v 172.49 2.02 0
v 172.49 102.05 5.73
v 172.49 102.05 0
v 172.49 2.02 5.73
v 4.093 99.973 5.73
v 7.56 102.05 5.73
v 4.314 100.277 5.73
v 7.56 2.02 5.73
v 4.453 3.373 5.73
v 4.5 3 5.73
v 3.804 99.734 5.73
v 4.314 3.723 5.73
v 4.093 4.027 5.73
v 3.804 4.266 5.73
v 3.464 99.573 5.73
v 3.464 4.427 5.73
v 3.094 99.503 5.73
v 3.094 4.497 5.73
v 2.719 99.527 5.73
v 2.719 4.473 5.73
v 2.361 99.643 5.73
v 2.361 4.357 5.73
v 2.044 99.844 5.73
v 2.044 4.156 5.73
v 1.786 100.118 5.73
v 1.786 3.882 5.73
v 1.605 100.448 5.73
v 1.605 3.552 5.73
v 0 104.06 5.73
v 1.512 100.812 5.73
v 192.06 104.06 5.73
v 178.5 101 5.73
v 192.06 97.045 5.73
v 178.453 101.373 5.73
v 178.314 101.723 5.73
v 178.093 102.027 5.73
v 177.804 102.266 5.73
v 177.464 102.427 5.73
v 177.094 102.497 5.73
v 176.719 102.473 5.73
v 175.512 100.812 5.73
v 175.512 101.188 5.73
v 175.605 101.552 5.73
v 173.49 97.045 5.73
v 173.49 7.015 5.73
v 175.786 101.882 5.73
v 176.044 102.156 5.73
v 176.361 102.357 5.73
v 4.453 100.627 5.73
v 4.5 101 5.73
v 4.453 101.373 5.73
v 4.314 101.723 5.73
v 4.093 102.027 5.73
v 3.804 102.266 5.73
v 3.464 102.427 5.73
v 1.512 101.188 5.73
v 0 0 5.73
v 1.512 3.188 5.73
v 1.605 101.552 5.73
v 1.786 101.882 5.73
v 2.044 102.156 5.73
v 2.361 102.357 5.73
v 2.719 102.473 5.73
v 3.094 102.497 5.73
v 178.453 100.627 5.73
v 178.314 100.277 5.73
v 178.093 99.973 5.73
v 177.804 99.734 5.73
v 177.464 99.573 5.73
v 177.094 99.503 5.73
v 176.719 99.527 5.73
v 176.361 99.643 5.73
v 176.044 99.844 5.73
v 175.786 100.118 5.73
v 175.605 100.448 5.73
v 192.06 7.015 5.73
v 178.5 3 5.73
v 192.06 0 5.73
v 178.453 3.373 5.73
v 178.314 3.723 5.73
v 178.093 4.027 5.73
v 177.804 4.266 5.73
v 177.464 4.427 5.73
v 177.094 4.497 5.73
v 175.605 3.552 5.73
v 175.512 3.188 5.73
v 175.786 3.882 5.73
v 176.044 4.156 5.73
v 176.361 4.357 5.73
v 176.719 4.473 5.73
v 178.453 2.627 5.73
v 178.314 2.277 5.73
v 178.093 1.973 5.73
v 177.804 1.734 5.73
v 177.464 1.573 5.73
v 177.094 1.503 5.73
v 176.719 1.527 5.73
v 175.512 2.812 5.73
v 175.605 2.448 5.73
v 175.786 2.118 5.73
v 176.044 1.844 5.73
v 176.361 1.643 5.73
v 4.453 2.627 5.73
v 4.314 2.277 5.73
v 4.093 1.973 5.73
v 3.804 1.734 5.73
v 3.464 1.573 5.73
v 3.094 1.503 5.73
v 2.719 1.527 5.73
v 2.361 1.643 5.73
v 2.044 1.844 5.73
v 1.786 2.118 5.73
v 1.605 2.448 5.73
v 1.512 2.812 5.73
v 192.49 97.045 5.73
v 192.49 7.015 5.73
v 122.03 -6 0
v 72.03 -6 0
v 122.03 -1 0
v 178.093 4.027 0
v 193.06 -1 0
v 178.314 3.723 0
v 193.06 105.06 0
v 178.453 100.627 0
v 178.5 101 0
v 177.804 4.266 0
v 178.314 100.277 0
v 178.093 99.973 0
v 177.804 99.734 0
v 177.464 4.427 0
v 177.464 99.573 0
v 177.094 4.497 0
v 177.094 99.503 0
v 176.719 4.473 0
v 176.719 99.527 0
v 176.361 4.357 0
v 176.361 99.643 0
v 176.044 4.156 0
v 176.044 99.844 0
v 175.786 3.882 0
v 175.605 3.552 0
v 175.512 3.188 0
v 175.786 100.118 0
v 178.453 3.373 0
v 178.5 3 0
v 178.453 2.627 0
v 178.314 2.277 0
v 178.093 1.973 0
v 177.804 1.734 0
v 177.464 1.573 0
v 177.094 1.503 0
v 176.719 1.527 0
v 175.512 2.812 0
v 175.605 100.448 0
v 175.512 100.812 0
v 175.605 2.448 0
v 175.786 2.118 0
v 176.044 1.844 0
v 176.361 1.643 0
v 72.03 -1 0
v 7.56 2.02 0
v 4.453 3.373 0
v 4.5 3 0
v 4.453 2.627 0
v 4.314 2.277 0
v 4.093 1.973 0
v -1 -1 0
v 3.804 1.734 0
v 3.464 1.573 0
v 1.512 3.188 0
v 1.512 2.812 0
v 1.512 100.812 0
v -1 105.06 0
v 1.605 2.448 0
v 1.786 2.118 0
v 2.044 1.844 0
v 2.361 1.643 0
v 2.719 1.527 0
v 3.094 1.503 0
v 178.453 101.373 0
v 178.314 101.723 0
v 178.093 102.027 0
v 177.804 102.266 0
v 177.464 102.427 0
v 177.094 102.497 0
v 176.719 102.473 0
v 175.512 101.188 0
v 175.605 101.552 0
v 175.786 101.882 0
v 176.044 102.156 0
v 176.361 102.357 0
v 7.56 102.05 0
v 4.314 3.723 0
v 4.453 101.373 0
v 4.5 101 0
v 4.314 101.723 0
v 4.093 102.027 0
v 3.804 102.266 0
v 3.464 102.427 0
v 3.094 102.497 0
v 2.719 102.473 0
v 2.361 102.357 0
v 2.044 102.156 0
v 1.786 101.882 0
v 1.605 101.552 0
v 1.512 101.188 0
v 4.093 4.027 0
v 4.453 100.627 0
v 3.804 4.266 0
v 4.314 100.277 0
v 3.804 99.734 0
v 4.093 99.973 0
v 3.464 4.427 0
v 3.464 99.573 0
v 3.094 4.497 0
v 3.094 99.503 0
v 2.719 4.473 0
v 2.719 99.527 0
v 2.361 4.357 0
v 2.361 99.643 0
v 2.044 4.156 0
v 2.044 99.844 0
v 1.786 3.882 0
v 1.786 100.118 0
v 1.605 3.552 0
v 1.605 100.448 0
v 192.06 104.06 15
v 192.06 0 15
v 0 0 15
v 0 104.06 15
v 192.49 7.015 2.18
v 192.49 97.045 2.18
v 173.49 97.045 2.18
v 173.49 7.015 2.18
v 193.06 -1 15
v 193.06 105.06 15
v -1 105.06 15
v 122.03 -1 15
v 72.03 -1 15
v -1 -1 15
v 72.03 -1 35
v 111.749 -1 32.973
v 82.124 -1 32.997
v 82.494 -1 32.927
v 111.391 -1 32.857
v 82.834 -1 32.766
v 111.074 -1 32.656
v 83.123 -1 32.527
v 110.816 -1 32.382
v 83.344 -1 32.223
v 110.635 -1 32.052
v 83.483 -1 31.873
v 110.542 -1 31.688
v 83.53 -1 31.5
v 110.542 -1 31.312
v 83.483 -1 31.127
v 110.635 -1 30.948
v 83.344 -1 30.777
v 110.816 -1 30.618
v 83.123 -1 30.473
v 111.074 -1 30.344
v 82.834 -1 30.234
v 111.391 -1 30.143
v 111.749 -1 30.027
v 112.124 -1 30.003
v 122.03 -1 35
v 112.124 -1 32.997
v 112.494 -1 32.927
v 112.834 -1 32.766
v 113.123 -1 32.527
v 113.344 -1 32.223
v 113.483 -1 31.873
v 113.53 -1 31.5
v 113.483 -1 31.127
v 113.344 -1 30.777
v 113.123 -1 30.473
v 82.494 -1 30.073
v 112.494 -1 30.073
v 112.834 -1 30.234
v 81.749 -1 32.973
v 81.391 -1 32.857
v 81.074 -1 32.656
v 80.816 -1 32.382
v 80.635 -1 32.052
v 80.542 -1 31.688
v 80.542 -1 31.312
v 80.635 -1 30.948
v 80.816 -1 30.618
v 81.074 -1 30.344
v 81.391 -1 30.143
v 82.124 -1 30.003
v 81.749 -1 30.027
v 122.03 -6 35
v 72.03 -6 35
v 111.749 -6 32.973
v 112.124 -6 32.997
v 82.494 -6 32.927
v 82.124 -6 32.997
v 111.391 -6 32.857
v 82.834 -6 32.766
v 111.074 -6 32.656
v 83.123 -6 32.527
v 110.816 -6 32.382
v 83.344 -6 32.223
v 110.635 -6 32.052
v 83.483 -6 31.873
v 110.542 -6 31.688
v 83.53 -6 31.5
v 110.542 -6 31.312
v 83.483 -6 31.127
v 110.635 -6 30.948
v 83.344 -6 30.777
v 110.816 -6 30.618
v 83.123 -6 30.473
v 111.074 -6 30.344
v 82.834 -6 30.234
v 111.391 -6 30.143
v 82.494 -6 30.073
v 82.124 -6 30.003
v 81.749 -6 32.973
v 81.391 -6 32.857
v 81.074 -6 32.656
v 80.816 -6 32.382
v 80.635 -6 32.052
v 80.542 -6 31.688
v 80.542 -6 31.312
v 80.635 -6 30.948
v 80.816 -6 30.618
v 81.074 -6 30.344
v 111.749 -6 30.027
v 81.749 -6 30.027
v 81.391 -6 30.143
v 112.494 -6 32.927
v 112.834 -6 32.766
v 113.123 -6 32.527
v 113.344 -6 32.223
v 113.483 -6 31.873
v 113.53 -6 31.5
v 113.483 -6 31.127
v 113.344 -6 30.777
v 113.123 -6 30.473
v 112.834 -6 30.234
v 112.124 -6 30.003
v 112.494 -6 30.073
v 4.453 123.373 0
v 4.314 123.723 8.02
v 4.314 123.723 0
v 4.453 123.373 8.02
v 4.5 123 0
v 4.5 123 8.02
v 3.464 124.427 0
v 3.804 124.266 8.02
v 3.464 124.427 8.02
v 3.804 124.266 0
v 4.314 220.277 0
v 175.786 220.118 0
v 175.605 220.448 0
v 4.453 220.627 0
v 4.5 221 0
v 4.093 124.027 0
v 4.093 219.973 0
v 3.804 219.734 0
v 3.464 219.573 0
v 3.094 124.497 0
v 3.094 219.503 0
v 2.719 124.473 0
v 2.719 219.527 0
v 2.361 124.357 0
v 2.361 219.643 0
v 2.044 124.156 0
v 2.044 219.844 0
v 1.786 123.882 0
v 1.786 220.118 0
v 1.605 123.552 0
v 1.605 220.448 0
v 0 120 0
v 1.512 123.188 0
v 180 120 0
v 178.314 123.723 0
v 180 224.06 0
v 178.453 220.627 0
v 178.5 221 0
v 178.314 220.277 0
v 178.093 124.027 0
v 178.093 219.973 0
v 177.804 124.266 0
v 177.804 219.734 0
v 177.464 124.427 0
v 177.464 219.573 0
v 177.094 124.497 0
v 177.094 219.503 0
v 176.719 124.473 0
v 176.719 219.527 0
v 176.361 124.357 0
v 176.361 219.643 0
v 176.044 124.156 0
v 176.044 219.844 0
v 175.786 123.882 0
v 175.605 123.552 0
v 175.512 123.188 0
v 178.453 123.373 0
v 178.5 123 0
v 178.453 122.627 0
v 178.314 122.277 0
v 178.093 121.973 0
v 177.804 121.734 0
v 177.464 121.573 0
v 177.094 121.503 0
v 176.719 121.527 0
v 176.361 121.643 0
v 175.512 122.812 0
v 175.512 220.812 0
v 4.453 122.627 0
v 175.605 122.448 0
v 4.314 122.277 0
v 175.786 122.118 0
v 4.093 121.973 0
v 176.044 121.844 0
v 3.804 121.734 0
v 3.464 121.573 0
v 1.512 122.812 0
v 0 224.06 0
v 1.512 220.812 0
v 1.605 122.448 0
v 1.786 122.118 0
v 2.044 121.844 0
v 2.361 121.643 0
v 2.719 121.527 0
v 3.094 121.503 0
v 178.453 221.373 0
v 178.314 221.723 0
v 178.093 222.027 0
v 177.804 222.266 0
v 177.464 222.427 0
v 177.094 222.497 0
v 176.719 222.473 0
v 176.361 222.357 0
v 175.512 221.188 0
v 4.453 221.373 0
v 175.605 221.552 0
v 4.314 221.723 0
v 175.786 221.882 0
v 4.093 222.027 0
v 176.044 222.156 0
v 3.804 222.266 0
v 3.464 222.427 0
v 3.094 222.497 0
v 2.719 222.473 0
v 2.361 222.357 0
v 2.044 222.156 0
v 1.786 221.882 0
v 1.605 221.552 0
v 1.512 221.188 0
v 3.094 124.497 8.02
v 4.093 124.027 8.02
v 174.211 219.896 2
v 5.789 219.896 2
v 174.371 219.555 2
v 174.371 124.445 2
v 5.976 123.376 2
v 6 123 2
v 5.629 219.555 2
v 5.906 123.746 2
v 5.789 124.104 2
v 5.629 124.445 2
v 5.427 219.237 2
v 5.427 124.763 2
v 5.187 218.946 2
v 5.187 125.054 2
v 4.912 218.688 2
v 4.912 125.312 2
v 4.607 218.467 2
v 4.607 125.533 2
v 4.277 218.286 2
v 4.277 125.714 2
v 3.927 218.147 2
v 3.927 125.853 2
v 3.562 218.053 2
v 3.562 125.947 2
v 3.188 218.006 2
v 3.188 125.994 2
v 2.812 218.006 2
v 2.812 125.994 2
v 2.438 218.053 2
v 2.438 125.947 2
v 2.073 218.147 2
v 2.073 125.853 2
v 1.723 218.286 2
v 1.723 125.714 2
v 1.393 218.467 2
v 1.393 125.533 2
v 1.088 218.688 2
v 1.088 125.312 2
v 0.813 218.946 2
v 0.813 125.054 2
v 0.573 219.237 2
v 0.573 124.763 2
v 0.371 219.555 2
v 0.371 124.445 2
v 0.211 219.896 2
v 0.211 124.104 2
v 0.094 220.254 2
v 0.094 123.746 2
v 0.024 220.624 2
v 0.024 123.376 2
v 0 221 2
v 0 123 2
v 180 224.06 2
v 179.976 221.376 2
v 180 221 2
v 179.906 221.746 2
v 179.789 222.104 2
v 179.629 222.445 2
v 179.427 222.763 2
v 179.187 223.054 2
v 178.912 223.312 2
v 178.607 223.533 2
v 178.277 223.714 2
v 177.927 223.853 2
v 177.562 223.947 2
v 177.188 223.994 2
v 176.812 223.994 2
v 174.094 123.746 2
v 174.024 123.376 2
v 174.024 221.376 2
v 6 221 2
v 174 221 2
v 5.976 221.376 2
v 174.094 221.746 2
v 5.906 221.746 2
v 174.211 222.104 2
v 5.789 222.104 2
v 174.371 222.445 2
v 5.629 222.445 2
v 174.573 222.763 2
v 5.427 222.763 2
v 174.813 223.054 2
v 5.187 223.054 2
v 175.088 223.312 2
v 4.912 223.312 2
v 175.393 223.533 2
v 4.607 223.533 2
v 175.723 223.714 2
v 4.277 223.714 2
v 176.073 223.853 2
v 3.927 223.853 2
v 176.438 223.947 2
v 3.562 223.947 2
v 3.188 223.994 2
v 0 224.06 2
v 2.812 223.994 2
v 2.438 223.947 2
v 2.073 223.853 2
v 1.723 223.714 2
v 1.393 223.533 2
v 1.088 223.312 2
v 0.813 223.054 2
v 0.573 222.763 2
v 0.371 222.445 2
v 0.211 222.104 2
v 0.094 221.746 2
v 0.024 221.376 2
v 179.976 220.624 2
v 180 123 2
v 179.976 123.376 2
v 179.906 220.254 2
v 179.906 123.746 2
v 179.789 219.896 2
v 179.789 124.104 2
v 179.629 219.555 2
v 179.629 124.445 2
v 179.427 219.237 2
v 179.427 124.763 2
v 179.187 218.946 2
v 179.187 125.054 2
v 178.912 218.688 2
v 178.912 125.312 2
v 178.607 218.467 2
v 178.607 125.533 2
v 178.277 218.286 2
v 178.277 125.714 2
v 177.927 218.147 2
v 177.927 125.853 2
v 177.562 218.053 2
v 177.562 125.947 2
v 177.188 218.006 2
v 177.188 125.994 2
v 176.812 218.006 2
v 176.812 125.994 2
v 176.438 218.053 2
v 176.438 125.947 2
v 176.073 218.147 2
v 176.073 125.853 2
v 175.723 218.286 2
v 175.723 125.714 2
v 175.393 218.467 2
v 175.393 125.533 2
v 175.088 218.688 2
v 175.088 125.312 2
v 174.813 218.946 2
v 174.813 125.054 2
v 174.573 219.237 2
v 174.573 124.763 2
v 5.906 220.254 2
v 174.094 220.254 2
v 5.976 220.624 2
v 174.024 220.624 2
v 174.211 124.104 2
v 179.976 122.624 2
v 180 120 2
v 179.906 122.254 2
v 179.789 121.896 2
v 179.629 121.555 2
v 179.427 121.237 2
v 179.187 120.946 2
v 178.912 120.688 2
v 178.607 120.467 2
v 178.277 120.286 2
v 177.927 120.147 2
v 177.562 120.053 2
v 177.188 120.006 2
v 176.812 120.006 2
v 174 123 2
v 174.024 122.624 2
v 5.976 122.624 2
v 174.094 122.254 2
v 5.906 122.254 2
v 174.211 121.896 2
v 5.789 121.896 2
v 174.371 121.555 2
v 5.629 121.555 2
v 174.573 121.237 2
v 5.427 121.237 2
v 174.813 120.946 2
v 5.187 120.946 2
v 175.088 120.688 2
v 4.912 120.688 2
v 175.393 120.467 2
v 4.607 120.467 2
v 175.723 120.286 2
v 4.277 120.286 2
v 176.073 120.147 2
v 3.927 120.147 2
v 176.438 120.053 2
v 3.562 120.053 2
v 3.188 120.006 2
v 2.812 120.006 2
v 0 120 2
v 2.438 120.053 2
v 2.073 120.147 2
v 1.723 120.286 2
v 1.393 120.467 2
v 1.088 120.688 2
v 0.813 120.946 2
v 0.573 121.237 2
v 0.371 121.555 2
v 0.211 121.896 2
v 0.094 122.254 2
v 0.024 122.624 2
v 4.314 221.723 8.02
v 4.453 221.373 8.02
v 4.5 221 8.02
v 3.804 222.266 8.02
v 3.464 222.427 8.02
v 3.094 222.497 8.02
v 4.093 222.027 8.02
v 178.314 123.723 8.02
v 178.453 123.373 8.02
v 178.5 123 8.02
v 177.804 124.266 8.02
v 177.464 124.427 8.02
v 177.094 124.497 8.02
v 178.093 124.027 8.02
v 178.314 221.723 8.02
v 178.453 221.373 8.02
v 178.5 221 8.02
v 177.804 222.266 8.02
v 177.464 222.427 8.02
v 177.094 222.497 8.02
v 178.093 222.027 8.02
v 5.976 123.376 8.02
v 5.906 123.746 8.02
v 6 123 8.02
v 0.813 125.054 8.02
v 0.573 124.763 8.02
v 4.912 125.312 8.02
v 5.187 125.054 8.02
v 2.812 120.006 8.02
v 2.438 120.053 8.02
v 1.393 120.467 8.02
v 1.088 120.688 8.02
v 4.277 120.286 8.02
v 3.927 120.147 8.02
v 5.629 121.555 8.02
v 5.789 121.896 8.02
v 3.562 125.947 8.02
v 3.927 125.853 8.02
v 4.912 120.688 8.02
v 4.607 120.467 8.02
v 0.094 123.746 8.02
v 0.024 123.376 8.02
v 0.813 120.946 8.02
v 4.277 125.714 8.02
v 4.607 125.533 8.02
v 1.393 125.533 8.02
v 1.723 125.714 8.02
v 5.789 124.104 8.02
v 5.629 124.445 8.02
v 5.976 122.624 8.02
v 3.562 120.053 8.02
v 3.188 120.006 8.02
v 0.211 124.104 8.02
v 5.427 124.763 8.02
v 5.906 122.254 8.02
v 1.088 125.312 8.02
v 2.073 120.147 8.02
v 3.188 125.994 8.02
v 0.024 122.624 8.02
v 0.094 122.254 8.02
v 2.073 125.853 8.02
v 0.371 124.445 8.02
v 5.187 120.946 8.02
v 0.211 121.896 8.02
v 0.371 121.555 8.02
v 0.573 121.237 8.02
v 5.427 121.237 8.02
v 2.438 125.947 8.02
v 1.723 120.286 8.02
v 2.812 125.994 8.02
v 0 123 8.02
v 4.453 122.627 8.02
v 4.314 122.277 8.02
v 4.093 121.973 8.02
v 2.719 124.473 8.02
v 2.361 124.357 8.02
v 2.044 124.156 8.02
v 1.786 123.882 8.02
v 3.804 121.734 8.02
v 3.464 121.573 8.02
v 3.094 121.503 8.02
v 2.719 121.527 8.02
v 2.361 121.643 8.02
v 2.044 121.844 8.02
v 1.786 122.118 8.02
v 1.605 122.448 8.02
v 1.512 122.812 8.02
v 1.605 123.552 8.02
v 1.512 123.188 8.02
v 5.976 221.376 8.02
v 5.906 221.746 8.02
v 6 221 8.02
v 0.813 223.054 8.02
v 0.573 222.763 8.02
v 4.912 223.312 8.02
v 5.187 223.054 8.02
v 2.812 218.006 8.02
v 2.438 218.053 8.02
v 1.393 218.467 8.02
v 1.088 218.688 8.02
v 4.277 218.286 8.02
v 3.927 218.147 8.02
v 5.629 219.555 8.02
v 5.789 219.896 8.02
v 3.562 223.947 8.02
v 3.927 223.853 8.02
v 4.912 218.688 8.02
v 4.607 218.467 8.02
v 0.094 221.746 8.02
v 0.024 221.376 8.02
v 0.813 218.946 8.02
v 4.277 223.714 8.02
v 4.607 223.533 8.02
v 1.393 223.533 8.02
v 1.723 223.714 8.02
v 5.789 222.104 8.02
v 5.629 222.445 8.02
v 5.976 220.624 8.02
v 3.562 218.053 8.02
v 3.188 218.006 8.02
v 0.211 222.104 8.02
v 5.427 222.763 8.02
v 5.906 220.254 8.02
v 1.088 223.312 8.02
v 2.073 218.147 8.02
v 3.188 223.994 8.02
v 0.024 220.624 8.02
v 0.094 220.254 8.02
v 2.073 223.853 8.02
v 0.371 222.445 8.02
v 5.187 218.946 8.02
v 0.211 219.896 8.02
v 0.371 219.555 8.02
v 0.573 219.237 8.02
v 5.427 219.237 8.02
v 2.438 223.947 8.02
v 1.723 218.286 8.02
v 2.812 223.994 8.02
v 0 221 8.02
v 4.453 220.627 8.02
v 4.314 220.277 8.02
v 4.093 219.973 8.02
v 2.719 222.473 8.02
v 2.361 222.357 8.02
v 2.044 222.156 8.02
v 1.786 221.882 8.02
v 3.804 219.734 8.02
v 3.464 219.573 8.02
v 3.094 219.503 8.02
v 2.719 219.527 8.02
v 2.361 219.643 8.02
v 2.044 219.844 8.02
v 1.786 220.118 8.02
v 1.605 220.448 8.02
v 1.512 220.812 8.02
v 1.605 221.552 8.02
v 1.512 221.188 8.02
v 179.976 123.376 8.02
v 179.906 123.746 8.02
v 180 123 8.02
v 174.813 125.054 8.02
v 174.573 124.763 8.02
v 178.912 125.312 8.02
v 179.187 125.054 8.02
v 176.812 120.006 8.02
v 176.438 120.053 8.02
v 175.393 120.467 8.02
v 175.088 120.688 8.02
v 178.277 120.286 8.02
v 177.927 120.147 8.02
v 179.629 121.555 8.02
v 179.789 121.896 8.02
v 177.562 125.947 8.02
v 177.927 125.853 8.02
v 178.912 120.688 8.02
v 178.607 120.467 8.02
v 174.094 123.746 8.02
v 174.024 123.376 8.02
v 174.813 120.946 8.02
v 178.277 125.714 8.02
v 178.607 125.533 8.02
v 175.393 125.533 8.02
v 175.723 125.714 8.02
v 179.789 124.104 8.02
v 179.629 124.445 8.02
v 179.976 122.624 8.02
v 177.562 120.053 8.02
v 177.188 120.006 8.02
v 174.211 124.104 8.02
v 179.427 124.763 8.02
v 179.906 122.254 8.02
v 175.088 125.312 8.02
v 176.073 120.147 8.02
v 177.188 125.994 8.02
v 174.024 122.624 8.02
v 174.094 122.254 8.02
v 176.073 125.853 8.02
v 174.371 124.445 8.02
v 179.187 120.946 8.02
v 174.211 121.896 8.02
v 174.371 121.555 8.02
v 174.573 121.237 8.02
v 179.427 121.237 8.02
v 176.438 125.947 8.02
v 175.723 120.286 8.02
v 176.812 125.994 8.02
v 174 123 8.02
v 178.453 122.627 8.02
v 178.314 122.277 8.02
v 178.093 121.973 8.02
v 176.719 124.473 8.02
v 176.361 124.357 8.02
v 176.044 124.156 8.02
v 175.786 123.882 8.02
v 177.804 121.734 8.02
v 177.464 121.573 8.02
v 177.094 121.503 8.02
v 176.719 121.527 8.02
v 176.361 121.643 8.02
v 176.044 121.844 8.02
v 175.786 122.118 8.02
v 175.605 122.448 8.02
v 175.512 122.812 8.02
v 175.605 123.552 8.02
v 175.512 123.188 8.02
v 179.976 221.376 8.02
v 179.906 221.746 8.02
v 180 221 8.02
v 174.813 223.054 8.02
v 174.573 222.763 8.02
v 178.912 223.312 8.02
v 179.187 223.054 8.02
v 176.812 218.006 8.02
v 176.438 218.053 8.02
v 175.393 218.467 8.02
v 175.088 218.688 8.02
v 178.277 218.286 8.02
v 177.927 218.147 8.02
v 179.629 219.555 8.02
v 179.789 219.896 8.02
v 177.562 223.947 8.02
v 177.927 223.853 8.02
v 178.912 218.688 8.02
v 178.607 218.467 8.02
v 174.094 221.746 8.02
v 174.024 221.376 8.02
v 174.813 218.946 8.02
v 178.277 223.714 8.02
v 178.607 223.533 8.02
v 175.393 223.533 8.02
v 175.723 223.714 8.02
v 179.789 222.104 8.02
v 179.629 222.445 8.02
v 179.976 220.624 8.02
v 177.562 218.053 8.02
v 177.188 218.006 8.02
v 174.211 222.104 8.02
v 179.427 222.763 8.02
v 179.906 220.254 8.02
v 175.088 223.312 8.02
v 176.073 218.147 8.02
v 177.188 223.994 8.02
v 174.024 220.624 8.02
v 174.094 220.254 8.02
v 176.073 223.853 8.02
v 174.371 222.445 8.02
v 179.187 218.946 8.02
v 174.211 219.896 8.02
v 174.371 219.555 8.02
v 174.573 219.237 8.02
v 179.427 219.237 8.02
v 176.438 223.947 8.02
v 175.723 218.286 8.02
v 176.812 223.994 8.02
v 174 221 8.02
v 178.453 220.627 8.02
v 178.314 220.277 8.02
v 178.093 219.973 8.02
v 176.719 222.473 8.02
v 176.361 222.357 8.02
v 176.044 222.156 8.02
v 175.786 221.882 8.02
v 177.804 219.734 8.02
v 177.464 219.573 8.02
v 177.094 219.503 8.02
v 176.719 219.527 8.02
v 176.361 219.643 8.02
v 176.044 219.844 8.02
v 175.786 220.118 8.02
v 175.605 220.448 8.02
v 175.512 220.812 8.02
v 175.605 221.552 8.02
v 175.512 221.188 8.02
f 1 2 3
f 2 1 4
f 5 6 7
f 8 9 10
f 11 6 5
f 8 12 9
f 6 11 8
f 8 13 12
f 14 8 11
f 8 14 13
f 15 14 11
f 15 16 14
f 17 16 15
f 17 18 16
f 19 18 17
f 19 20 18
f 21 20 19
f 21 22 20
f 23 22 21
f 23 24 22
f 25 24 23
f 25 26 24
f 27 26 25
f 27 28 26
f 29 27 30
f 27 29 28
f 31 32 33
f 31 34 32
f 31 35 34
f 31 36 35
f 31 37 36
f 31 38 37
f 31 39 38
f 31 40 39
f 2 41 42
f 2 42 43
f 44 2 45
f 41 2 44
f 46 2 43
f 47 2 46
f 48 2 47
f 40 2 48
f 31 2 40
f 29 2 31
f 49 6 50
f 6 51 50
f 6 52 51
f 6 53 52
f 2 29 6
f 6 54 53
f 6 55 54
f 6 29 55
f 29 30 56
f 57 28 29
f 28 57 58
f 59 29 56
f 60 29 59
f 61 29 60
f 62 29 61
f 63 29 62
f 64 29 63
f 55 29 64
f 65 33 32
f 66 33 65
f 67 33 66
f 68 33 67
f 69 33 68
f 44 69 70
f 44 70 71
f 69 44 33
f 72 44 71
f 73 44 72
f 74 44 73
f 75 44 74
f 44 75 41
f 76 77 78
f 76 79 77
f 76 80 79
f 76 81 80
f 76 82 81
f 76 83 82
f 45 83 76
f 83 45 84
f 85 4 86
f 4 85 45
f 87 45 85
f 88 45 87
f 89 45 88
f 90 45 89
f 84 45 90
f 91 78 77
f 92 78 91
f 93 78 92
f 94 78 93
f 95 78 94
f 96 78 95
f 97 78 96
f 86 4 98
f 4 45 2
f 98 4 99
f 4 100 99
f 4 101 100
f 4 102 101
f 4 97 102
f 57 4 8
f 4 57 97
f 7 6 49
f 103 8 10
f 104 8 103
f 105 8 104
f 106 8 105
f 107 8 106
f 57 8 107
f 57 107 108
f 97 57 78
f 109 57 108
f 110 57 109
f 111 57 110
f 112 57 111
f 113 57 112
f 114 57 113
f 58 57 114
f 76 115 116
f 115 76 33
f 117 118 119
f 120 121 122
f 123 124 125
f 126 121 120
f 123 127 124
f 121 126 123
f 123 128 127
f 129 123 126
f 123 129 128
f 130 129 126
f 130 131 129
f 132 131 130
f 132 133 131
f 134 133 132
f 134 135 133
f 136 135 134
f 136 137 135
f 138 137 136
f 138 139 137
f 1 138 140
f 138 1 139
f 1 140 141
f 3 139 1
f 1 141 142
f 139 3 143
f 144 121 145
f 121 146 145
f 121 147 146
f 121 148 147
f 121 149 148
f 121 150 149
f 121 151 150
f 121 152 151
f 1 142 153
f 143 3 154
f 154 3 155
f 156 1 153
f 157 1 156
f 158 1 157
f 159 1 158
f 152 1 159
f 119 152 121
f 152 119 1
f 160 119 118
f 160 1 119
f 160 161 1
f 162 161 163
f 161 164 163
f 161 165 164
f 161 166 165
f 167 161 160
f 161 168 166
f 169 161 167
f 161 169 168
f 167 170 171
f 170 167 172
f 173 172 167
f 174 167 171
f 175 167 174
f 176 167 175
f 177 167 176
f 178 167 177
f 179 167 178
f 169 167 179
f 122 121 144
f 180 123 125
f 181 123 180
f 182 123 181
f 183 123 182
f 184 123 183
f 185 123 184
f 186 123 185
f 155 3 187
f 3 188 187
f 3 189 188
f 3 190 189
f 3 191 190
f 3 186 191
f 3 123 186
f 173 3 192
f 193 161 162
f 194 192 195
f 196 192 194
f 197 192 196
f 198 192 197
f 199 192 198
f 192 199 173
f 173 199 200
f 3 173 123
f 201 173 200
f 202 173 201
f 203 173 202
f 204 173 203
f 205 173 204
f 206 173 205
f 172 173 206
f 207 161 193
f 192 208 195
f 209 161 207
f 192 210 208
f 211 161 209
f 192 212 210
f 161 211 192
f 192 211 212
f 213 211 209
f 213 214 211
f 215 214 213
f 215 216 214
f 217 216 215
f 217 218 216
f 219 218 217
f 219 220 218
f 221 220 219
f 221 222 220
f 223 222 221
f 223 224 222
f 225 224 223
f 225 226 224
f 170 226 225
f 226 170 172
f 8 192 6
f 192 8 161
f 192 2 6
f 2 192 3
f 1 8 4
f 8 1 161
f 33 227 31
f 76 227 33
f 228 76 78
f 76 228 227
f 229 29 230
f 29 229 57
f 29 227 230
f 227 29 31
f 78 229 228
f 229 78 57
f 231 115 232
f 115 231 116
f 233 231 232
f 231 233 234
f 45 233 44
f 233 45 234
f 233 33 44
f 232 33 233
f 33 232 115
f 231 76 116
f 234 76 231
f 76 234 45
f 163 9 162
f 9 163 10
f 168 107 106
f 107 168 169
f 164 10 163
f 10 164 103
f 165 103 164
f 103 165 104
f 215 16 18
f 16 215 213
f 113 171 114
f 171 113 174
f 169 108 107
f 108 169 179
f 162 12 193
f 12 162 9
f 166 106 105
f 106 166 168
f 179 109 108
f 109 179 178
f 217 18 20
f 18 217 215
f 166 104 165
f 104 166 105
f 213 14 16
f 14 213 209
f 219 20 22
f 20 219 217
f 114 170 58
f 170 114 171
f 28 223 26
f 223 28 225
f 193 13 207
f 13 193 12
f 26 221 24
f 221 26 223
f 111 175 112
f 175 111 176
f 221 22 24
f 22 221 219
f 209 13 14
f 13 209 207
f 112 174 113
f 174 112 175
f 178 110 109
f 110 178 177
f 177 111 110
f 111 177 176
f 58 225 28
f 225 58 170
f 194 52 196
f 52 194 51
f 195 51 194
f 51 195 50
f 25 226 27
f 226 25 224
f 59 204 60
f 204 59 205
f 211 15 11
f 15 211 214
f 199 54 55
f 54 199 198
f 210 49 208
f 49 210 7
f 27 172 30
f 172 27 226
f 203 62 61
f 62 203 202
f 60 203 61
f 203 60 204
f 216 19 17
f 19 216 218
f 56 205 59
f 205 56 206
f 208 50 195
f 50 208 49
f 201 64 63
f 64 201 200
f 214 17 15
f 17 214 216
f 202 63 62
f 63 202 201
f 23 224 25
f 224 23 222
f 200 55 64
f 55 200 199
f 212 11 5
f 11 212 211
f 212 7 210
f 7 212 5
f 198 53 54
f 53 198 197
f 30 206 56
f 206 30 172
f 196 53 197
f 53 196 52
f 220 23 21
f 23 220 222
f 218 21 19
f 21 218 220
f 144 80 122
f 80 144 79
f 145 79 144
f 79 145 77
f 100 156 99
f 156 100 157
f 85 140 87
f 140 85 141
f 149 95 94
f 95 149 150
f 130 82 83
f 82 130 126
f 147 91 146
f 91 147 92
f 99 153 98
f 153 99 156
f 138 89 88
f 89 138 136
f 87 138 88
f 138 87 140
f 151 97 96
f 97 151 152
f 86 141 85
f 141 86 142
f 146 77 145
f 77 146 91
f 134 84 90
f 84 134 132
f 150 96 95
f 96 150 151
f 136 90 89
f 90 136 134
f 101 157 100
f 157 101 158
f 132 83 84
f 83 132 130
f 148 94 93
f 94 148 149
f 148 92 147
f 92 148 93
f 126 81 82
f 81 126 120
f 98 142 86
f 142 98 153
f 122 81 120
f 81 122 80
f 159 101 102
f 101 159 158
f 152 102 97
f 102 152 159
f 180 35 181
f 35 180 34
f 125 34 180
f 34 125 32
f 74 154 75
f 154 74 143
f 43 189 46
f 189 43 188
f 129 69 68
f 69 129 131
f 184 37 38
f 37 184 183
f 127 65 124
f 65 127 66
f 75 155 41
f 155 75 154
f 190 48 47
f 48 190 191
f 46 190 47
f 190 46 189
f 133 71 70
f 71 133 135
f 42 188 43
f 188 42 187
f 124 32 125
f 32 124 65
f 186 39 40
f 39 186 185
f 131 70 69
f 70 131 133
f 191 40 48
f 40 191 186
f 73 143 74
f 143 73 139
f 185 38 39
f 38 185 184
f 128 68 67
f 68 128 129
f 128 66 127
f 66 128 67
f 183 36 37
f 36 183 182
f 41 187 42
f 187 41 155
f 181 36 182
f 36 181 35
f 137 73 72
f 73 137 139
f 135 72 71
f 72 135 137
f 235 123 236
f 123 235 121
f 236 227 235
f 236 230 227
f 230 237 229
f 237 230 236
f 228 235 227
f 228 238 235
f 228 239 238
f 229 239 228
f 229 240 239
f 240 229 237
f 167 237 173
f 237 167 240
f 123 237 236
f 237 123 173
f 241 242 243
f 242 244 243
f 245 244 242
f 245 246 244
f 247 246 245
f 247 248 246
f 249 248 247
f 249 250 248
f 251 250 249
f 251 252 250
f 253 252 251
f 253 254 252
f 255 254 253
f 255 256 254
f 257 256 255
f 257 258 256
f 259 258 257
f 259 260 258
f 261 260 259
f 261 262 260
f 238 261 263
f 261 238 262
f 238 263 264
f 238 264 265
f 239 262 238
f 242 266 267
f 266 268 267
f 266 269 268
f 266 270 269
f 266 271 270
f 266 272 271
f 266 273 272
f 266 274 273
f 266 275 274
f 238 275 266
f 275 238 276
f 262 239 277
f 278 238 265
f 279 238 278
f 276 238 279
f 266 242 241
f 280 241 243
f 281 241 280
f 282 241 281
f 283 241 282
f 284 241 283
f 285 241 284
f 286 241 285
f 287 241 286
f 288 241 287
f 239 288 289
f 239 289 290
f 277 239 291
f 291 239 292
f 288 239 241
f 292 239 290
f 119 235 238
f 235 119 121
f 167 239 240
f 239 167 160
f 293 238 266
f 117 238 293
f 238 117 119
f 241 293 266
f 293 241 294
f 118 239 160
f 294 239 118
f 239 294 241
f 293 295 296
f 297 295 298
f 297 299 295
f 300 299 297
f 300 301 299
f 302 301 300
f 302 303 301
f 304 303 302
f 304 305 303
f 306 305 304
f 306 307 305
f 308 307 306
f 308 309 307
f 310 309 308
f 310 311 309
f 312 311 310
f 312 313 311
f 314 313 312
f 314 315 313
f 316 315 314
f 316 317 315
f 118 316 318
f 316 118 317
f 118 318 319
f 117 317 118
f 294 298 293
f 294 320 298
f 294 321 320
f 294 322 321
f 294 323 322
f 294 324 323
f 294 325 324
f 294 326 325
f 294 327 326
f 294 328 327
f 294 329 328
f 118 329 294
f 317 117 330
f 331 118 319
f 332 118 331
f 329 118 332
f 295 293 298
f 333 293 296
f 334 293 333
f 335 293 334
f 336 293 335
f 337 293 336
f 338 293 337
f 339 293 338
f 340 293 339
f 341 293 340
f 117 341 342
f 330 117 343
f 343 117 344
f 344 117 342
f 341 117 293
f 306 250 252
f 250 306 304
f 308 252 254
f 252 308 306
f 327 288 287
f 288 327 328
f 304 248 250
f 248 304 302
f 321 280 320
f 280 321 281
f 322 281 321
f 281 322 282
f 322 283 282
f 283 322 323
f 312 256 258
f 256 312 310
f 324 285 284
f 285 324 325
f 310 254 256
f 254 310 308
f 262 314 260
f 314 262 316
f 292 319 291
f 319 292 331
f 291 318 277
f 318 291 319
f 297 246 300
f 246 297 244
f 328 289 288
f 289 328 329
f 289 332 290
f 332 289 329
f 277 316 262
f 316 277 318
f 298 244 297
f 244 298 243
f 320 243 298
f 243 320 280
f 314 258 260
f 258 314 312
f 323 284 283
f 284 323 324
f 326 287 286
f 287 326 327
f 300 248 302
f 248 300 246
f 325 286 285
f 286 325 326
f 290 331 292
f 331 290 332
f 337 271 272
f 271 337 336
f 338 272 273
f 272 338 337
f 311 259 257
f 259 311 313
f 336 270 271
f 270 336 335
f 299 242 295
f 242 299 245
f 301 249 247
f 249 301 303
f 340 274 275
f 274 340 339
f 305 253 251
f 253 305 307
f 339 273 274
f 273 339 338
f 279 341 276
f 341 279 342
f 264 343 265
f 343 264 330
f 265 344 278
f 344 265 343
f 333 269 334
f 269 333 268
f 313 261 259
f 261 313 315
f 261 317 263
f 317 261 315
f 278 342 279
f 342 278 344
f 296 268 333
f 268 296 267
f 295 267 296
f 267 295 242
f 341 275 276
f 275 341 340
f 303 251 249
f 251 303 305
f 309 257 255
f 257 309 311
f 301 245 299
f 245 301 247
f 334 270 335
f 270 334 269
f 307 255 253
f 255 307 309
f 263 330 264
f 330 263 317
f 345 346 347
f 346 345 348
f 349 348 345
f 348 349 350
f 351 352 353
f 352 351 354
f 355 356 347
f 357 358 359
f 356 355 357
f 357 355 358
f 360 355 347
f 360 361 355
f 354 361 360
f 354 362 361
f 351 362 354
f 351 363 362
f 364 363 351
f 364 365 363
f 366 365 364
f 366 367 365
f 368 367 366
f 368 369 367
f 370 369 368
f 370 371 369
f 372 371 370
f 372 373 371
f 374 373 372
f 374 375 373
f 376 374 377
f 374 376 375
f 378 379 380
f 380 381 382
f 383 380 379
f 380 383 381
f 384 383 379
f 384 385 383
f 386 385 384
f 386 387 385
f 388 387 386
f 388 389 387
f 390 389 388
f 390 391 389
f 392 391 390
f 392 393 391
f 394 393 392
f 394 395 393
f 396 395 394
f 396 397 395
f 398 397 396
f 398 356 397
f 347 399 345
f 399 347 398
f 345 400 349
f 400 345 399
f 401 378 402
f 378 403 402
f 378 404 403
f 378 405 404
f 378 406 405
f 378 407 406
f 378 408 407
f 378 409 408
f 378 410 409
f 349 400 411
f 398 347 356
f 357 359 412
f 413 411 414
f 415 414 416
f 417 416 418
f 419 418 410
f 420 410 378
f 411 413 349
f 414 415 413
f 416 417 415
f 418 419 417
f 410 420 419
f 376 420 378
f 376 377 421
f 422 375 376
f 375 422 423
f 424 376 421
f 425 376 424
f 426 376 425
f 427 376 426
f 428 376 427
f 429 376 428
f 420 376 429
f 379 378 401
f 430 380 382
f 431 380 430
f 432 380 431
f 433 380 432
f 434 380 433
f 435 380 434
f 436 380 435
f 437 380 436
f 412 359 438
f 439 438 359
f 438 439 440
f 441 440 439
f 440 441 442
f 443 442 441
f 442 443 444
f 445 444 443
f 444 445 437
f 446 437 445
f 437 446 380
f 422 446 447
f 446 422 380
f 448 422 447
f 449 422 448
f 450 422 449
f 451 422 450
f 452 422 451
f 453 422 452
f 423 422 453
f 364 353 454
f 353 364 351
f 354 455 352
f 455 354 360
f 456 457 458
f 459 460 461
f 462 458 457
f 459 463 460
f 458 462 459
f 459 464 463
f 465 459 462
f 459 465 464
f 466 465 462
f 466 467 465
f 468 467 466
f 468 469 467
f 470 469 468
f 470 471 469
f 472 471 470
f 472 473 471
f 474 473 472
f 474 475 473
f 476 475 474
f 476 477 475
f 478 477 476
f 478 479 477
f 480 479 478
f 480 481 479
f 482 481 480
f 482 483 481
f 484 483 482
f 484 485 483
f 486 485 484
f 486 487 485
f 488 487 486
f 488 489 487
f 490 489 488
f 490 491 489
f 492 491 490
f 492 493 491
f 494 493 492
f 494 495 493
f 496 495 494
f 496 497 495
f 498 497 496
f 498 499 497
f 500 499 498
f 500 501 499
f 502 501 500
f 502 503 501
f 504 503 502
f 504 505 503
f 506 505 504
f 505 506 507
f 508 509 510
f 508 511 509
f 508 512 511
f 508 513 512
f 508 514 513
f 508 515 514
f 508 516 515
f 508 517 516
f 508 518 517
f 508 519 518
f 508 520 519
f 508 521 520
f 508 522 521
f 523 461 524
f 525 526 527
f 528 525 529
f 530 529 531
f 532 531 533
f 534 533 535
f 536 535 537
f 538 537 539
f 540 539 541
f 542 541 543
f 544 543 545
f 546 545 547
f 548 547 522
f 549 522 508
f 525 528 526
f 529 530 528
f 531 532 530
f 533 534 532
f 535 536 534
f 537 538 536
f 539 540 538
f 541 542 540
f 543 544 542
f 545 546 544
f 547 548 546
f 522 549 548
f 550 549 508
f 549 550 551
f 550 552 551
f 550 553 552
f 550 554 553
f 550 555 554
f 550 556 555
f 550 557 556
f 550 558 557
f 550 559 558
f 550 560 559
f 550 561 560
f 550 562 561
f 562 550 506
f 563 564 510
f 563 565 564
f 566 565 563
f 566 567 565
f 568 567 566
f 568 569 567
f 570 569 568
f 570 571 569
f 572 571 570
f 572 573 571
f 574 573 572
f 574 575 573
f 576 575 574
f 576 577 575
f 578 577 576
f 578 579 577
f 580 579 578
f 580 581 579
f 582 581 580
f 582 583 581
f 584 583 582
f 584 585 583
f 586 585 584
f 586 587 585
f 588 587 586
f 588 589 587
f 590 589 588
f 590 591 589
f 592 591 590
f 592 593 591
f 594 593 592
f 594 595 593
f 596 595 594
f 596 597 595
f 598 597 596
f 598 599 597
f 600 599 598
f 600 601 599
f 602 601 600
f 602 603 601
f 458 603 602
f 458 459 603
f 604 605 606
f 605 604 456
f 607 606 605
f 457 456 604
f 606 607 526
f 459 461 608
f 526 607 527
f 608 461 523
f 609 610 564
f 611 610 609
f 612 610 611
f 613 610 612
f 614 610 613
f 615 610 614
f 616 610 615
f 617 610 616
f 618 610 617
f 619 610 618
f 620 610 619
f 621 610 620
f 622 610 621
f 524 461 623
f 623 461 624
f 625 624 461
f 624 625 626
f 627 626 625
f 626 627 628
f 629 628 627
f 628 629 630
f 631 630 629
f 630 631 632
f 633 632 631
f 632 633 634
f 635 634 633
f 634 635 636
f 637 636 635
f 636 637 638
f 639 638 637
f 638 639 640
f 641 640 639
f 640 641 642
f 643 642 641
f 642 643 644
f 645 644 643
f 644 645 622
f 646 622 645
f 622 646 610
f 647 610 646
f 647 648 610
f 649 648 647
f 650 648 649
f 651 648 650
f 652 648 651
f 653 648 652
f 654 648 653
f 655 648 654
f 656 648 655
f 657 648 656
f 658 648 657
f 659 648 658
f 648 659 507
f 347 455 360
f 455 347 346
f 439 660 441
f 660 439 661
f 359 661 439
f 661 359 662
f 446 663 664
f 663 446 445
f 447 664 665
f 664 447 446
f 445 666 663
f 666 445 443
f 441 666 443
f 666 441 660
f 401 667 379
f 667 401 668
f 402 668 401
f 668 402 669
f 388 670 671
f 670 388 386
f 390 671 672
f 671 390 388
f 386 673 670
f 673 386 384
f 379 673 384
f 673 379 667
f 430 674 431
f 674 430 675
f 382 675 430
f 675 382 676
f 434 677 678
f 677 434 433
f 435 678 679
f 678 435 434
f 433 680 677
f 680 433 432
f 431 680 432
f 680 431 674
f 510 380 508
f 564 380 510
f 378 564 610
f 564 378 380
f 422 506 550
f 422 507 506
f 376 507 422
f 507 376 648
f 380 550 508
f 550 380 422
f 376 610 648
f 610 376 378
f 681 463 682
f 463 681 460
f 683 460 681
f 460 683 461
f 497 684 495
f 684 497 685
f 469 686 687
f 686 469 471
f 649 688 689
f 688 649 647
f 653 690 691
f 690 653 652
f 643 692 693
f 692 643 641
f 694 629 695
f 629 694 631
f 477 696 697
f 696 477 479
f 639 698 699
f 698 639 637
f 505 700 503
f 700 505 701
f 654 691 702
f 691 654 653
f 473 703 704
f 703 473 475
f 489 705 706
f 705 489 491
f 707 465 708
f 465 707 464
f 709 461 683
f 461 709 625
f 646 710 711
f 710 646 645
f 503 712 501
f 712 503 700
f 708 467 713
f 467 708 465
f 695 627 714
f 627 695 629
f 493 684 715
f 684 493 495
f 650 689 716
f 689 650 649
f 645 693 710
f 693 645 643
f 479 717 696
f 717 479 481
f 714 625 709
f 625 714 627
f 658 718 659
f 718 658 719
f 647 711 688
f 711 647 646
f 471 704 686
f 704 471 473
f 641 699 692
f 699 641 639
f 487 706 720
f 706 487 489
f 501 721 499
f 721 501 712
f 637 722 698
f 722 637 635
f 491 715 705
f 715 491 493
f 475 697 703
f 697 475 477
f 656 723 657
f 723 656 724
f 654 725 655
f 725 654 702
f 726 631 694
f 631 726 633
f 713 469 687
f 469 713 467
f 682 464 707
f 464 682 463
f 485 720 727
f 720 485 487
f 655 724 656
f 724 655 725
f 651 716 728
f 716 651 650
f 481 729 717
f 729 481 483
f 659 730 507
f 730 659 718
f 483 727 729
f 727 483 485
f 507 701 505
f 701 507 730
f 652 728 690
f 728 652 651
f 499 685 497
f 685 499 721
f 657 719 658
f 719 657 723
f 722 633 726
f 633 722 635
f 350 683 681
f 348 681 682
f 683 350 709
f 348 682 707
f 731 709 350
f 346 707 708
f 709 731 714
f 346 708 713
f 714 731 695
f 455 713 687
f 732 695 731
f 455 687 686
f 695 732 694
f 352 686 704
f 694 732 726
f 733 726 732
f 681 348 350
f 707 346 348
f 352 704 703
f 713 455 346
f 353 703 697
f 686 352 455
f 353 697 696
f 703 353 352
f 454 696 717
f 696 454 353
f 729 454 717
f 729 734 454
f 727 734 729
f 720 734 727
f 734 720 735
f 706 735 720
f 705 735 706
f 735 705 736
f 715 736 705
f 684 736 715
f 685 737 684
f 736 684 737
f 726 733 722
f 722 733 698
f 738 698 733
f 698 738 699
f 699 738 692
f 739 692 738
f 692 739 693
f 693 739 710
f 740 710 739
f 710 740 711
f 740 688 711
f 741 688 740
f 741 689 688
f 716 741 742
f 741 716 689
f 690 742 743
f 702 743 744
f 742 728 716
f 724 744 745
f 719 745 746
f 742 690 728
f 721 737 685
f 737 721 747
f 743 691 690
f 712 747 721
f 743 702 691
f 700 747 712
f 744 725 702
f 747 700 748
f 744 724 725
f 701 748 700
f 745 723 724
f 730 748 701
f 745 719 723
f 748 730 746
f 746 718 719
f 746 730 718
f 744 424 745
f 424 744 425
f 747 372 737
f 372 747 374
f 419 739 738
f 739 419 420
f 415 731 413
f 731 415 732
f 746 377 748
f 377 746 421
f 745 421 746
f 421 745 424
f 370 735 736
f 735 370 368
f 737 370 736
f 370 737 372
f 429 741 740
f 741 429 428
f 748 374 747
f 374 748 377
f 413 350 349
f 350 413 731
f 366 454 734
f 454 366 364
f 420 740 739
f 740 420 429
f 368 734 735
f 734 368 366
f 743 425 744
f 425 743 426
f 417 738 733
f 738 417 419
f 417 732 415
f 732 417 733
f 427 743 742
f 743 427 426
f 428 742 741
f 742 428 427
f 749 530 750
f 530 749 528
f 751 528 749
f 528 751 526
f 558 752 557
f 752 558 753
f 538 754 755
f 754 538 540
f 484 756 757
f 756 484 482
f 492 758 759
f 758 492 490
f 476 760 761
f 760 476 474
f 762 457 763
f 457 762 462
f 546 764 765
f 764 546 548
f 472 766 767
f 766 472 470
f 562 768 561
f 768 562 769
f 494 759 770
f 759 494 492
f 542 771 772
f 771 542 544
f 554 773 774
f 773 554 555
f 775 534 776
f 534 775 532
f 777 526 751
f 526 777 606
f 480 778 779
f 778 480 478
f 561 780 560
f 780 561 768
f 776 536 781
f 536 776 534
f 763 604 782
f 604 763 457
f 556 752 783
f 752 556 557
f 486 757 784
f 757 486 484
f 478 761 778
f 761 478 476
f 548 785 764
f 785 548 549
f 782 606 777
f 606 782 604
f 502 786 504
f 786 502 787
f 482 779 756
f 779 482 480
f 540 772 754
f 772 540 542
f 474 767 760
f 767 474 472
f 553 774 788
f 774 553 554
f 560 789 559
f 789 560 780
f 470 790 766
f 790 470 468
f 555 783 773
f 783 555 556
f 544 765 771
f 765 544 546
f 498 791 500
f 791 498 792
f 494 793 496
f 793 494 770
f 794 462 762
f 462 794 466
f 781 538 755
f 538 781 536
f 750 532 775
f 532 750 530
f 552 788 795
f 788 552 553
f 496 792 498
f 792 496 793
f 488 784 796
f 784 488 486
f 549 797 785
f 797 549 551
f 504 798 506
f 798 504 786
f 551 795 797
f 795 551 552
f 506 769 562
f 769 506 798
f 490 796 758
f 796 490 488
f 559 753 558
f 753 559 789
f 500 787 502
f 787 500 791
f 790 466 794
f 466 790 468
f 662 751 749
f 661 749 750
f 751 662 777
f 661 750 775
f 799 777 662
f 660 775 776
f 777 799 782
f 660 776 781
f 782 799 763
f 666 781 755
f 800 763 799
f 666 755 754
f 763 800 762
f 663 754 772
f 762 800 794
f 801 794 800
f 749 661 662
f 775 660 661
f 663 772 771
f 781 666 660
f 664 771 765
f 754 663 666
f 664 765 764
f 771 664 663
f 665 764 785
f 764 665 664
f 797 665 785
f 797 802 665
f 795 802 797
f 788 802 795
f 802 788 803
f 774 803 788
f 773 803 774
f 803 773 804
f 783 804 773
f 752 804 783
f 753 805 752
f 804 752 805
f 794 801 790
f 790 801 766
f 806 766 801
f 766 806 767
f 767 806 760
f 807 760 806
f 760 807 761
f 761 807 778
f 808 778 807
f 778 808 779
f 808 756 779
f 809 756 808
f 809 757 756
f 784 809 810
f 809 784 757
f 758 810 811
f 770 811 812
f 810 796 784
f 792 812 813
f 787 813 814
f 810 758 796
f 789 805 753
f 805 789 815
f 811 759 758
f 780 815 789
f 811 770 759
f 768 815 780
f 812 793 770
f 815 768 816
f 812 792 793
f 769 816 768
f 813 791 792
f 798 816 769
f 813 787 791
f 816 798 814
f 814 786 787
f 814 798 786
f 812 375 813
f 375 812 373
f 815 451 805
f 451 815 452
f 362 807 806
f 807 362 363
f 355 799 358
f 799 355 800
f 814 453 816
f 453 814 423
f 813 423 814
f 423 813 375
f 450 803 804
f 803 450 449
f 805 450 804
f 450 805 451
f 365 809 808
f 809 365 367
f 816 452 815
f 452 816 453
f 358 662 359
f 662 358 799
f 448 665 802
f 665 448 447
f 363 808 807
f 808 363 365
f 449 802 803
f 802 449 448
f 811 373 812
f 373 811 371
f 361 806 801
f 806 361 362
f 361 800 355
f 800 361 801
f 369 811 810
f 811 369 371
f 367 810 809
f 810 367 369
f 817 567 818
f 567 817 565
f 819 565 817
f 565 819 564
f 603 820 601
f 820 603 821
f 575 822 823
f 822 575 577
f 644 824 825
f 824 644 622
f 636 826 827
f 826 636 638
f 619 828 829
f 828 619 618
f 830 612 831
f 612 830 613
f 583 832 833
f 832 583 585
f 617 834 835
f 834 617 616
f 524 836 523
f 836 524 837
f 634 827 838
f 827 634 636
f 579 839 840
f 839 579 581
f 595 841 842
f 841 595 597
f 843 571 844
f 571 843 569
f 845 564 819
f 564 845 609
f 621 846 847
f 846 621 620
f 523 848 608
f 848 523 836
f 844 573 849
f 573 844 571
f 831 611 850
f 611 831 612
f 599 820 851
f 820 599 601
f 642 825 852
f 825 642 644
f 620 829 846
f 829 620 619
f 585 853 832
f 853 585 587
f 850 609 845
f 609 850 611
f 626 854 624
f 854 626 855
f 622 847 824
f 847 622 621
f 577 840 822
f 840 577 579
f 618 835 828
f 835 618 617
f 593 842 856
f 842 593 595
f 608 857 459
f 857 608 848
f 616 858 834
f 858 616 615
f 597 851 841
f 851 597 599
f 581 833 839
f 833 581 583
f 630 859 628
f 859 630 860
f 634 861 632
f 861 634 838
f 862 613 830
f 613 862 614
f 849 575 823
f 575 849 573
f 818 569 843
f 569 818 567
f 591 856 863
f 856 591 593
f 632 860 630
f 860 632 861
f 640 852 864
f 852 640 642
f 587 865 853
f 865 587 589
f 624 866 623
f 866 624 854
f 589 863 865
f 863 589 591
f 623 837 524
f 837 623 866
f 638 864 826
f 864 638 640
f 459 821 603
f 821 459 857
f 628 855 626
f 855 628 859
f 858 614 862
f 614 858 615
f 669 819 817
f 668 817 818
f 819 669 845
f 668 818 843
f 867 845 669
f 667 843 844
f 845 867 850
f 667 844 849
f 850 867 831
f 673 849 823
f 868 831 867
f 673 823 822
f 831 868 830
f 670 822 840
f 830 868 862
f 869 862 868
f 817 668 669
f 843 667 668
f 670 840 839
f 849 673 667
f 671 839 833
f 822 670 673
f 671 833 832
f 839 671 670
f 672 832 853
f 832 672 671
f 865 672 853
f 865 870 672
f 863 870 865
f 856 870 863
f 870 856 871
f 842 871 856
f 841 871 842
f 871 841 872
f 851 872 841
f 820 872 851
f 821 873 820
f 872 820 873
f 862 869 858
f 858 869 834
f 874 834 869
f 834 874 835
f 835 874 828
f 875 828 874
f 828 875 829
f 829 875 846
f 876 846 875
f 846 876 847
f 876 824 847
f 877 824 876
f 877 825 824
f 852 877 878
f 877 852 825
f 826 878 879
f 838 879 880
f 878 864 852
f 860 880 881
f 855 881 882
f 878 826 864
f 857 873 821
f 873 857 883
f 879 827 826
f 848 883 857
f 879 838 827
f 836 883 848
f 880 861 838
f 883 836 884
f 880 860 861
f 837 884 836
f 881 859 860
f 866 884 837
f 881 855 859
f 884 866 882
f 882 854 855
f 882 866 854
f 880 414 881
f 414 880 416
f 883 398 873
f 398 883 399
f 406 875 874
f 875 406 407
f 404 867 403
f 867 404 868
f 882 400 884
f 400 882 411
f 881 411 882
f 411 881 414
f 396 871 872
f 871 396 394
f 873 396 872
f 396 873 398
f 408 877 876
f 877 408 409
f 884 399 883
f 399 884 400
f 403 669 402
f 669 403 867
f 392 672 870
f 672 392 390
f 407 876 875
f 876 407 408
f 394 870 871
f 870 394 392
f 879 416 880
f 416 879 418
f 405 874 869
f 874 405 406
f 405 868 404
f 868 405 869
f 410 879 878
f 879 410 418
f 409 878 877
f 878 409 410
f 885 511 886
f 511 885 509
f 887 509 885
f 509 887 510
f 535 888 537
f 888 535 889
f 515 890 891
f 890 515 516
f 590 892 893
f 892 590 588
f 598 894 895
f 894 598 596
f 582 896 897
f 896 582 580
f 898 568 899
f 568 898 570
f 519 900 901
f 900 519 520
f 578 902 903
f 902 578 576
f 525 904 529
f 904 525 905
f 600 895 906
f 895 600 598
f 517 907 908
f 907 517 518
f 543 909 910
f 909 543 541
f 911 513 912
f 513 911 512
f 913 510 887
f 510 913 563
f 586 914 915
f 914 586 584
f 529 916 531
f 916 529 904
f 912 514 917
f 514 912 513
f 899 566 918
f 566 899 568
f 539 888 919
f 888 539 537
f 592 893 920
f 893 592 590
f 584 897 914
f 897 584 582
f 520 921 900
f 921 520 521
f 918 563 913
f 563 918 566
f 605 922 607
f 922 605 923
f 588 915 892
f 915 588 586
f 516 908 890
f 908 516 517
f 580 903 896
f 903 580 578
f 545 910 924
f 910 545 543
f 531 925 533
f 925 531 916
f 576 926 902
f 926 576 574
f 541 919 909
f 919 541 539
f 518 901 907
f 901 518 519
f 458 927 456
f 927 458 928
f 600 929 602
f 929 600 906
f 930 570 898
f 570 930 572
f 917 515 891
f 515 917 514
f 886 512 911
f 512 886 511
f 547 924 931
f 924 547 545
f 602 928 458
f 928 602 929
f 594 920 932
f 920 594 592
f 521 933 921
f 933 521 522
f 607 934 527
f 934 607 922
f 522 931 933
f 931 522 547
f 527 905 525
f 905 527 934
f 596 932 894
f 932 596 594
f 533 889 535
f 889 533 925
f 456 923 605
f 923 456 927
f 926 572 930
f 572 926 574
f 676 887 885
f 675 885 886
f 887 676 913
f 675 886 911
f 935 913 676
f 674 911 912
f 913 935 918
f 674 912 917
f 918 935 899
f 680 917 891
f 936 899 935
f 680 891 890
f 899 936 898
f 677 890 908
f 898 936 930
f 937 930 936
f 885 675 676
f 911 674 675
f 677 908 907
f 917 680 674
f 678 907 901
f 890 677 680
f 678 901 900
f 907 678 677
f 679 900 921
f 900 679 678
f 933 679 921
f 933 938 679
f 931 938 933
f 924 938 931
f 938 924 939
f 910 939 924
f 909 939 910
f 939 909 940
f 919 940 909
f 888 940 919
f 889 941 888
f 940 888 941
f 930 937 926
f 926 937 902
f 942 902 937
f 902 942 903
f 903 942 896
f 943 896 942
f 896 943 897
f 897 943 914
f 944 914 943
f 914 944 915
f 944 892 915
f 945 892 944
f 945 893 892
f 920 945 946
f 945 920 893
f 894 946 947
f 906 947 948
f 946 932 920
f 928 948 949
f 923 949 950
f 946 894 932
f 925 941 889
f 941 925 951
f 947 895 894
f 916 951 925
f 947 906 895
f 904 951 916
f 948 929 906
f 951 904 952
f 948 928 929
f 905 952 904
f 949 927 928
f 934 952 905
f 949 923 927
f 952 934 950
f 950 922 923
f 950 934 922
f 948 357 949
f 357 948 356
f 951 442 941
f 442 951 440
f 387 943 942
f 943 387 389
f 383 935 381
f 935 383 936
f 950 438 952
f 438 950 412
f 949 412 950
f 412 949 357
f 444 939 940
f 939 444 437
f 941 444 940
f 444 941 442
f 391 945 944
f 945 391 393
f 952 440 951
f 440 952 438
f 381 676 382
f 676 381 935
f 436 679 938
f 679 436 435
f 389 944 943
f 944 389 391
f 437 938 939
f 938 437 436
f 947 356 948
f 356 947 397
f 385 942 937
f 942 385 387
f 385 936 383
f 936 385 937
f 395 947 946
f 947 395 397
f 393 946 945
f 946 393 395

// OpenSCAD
/**
Copyright Caitlin Campbell 2020.
This documentation describes Open Hardware and is licensed under the
CERN OHL-S v.2.

You may redistribute and modify this documentation under the terms of the
CERN OHL-S v2. (http://ohwr.org/cernohl). This documentation is distributed
WITHOUT ANY EXPRESS OR IMPLIED WARRANTY, INCLUDING OF
MERCHANTABILITY, SATISFACTORY QUALITY AND FITNESS FOR A
PARTICULAR PURPOSE. Please see the CERN OHL-S v.2 for applicable
conditions.
**/


// All raw dimensions pulled from https://duet3d.dozuki.com/Wiki/PanelDue#Section_Dimensions

// Raw dimensions of the board
boardx = 192.06;
boardy = 104.06;
boardz = 1.75;

// Raw dimensions of the screen
screenx = 164.93;
screeny = 100.03;
screenz = 5.23;

// How far recessed the screen should be from the front.
screen_flush = 0.5;

// The total depth of the case
total_depth = 15;

// How thick the backplate should be
backplatez = 2;


// How wide the part is that we screw on to the printer
attachment_width = 50;

back_standoff = total_depth - screenz - boardz;


// Our front assembly
front();

// Our back assembly, move 120mm.
translate([0,120,0])
back();


// This is the main function that defines the back plate
module back() {
    
    // We have a cube and subtract the screw holes from it
    difference() {
        cube([165+15,boardy,backplatez]);

        // THis is a screw function (see below)
        screws(backplatez);
    }
    
    // We add the standoffs on top of the screw holes.
    // These numbers pulled from https://duet3d.dozuki.com/Wiki/PanelDue#Section_Dimensions
    translate([3,3,0])
    standoff();
    translate([3,3+98,0])
    standoff();
    translate([3+174,3,0])
    standoff();
    translate([3+174,3+98,0])
    standoff();
    
}

// The main front assembly
module front() {

    // We start by creating the frame by hollowing out a box
    difference() {

        // Out box moved 1mm in x and y.
        translate([-1,-1,0])
        cube([boardx+2,boardy+2,total_depth]);

        // We subtract out out positive screen assembly from the box. (see function below.)
        screen();

        // We then subtract out the screws
        screws(screenz+screen_flush);
    }
    
    // This is the part that attaches to the top of the Railcore
    translate([(boardx+2)/2-(attachment_width/2),-5-1,0])
    difference(){
        cube([attachment_width,5,20+total_depth]);
        translate([10,5,20+total_depth-3.5])
        rotate([90,0,0])
        cylinder(h=5, d=3,$fn=25);
        translate([10,5,20+total_depth-3.5])
        rotate([90,0,0])
        cylinder(h=5, d=3,$fn=25);
        translate([attachment_width-10,5,20+total_depth-3.5])
        rotate([90,0,0])
        cylinder(h=5, d=3,$fn=25);
        
    }

}

// Standoff function. I isolate it because we use it over and over again.
module standoff() {
    
    difference () {
        cylinder(h=back_standoff, d=6,$fn=50);
        cylinder(h=back_standoff, d=3,$fn=25);
    }
}

// Generates holes in the correct location of any height.
// These numbers pulled from https://duet3d.dozuki.com/Wiki/PanelDue#Section_Dimensions
module screws(height) {
    translate([3,3,0])
    cylinder(h=height, d=3,$fn=25);
    translate([3,3+98,0])
    cylinder(h=height, d=3,$fn=25);
        
    translate([3+174,3,0])
    cylinder(h=height, d=3,$fn=25);
    translate([3+174,3+98,0])
    cylinder(h=height, d=3,$fn=25);
}


// This is a VERY rough 3d render of the whole board and screen facing down
module screen() {
    
    // We join these together.
    union() {
        // THe screen
        translate([7.56,2.02,0])
        cube([screenx,screeny,screenz+screen_flush]);

        // The board above the screen
        // The z is total_depth because we need to hollow the entire back.
        translate([0,0,screenz+screen_flush])
        cube([boardx,boardy,total_depth]);
        
        // The electronics 
        translate([screenx+6.56+2,(boardy-(screeny-10))/2,screenz+screen_flush-3.55])
        cube([19,screeny-10,3.55]);
    }
}
